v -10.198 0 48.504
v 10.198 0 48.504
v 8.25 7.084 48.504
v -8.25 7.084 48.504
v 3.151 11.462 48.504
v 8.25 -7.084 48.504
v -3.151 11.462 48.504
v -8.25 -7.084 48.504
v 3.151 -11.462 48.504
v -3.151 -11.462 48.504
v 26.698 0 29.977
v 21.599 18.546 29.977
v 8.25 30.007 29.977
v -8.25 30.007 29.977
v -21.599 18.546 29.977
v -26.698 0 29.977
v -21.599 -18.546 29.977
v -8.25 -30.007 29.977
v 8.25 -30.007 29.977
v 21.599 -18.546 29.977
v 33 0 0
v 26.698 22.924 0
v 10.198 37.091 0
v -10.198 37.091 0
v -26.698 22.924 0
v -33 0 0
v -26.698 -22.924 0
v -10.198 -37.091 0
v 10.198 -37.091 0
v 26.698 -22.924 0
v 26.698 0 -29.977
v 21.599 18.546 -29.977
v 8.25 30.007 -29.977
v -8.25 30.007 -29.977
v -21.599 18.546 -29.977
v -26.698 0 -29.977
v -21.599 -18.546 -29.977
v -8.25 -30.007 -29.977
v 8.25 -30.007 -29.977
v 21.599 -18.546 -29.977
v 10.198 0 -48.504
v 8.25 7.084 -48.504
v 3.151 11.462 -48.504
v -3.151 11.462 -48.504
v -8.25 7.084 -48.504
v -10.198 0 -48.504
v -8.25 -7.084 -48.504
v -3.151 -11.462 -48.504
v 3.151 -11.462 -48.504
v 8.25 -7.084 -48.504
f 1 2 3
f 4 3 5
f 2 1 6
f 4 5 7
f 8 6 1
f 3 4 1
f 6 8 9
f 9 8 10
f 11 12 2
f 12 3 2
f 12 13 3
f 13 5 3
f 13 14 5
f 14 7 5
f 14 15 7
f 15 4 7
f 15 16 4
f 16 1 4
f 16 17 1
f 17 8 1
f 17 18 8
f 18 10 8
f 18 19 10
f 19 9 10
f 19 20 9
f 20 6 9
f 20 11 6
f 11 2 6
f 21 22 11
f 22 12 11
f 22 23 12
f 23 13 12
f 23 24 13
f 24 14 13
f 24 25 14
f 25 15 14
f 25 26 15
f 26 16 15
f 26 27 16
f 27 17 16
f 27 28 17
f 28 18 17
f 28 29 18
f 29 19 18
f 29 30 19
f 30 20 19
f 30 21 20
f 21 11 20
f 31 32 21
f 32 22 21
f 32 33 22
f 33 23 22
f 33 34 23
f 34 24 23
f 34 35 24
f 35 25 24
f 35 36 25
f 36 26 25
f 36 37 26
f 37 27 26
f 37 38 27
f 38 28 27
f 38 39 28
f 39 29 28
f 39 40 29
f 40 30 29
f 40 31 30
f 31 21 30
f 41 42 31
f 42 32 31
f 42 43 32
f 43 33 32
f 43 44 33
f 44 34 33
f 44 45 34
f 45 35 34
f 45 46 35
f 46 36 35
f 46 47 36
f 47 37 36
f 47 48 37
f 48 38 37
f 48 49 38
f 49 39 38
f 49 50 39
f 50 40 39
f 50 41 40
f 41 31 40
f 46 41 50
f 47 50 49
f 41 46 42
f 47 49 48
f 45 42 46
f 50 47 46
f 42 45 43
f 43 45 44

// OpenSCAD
// Generated by SolidPython 1.0.1 on 2020-07-29 00:46:49


scale(v = [11, 13, 17]) {
	sphere(r = 3);
}
/***********************************************
*********      SolidPython code:      **********
************************************************
 
# import packages: SolidPython
from solid import *
from solid.utils import *
from itertools import chain, combinations, permutations


class Resize:

    def __init__(self, scad_file):
        self.scad_file = scad_file
        #self.scad_file = import_scad(scad_file)
        # cone/cylinder param:
        self.r1 = 0
        self.r2 = 0
        self.h = 0
        # rectangular prism param:
        self.w = 0
        self.l = 0
        # ellipse param:
        self.r = 0

    # import OpenScad code (file name corresponds to shape)


    # classify shape + parameters
    def assign(self, param1, param2, param3):
        if self.scad_file == 'cone.scad':
            self.r1 = param1
            self.r2 = param2
            self.h = param3
        elif self.scad_file == 'cylinder.scad':
            self.r1 = param1
            self.r2 = param2
            self.h = param3
        elif self.scad_file == 'rectangularPrism.scad':
            self.h = param1
            self.l = param2
            self.w = param3
        else:
            self.r = param1
            self.h = param2

    # resize parameters
    def iterate(self):
        x = range(3, 20, 2)
        i = 1
        if self.scad_file == 'cone.scad':
            tempList = list(permutations(x, 2))
            for temp in tempList:
                param1 = temp[0]
                param2 = temp[1]
                filepath = 'produced_scad_files/' + 'cone' + str(param1) + '_' + str(param2) + '_' + '.scad'
                scad_render_to_file(cylinder(h=param1, r1=param2, r2=0), filepath)

        elif self.scad_file == 'cylinder.scad':
            tempList = list(permutations(x, 3))
            for temp in tempList:
                param1 = temp[0]
                param2 = temp[1]
                filepath = 'produced_scad_files/' + 'cylinder' + str(param1) + '_' + str(param2) + '_' + '.scad'
                scad_render_to_file(cylinder(h=param1, r1=param2, r2=param2), filepath)

        elif self.scad_file == 'rectangularPrism.scad':
            tempList = list(permutations(x, 3))
            for temp in tempList:
                param1 = temp[0]
                param2 = temp[1]
                param3 = temp[2]
                filepath = 'produced_scad_files/' + 'rectangularPrism' + str(param1) + '_' + str(param2) + '_' + str(
                    param3) + '.scad'
                scad_render_to_file(cube(size=(param1, param2, param3)), filepath)

        elif self.scad_file == 'ellipse.scad':
            tempList = list(permutations(x, 4))
            for temp in tempList:
                param1 = temp[0]
                param2 = temp[1]
                param3 = temp[2]
                param4 = temp[3]
                filepath = 'produced_scad_files/' + 'ellipse' + str(param1) + '_' + str(param2) + '_' + str(param3) + '_' + str(param4) + '.scad'
                scad_render_to_file(scale([param1, param2, param3])(sphere(r=param4)), filepath)

    def render_to_scadfile(self):
        scad_render_to_file(scad, 'example.scad') 
 
************************************************/
